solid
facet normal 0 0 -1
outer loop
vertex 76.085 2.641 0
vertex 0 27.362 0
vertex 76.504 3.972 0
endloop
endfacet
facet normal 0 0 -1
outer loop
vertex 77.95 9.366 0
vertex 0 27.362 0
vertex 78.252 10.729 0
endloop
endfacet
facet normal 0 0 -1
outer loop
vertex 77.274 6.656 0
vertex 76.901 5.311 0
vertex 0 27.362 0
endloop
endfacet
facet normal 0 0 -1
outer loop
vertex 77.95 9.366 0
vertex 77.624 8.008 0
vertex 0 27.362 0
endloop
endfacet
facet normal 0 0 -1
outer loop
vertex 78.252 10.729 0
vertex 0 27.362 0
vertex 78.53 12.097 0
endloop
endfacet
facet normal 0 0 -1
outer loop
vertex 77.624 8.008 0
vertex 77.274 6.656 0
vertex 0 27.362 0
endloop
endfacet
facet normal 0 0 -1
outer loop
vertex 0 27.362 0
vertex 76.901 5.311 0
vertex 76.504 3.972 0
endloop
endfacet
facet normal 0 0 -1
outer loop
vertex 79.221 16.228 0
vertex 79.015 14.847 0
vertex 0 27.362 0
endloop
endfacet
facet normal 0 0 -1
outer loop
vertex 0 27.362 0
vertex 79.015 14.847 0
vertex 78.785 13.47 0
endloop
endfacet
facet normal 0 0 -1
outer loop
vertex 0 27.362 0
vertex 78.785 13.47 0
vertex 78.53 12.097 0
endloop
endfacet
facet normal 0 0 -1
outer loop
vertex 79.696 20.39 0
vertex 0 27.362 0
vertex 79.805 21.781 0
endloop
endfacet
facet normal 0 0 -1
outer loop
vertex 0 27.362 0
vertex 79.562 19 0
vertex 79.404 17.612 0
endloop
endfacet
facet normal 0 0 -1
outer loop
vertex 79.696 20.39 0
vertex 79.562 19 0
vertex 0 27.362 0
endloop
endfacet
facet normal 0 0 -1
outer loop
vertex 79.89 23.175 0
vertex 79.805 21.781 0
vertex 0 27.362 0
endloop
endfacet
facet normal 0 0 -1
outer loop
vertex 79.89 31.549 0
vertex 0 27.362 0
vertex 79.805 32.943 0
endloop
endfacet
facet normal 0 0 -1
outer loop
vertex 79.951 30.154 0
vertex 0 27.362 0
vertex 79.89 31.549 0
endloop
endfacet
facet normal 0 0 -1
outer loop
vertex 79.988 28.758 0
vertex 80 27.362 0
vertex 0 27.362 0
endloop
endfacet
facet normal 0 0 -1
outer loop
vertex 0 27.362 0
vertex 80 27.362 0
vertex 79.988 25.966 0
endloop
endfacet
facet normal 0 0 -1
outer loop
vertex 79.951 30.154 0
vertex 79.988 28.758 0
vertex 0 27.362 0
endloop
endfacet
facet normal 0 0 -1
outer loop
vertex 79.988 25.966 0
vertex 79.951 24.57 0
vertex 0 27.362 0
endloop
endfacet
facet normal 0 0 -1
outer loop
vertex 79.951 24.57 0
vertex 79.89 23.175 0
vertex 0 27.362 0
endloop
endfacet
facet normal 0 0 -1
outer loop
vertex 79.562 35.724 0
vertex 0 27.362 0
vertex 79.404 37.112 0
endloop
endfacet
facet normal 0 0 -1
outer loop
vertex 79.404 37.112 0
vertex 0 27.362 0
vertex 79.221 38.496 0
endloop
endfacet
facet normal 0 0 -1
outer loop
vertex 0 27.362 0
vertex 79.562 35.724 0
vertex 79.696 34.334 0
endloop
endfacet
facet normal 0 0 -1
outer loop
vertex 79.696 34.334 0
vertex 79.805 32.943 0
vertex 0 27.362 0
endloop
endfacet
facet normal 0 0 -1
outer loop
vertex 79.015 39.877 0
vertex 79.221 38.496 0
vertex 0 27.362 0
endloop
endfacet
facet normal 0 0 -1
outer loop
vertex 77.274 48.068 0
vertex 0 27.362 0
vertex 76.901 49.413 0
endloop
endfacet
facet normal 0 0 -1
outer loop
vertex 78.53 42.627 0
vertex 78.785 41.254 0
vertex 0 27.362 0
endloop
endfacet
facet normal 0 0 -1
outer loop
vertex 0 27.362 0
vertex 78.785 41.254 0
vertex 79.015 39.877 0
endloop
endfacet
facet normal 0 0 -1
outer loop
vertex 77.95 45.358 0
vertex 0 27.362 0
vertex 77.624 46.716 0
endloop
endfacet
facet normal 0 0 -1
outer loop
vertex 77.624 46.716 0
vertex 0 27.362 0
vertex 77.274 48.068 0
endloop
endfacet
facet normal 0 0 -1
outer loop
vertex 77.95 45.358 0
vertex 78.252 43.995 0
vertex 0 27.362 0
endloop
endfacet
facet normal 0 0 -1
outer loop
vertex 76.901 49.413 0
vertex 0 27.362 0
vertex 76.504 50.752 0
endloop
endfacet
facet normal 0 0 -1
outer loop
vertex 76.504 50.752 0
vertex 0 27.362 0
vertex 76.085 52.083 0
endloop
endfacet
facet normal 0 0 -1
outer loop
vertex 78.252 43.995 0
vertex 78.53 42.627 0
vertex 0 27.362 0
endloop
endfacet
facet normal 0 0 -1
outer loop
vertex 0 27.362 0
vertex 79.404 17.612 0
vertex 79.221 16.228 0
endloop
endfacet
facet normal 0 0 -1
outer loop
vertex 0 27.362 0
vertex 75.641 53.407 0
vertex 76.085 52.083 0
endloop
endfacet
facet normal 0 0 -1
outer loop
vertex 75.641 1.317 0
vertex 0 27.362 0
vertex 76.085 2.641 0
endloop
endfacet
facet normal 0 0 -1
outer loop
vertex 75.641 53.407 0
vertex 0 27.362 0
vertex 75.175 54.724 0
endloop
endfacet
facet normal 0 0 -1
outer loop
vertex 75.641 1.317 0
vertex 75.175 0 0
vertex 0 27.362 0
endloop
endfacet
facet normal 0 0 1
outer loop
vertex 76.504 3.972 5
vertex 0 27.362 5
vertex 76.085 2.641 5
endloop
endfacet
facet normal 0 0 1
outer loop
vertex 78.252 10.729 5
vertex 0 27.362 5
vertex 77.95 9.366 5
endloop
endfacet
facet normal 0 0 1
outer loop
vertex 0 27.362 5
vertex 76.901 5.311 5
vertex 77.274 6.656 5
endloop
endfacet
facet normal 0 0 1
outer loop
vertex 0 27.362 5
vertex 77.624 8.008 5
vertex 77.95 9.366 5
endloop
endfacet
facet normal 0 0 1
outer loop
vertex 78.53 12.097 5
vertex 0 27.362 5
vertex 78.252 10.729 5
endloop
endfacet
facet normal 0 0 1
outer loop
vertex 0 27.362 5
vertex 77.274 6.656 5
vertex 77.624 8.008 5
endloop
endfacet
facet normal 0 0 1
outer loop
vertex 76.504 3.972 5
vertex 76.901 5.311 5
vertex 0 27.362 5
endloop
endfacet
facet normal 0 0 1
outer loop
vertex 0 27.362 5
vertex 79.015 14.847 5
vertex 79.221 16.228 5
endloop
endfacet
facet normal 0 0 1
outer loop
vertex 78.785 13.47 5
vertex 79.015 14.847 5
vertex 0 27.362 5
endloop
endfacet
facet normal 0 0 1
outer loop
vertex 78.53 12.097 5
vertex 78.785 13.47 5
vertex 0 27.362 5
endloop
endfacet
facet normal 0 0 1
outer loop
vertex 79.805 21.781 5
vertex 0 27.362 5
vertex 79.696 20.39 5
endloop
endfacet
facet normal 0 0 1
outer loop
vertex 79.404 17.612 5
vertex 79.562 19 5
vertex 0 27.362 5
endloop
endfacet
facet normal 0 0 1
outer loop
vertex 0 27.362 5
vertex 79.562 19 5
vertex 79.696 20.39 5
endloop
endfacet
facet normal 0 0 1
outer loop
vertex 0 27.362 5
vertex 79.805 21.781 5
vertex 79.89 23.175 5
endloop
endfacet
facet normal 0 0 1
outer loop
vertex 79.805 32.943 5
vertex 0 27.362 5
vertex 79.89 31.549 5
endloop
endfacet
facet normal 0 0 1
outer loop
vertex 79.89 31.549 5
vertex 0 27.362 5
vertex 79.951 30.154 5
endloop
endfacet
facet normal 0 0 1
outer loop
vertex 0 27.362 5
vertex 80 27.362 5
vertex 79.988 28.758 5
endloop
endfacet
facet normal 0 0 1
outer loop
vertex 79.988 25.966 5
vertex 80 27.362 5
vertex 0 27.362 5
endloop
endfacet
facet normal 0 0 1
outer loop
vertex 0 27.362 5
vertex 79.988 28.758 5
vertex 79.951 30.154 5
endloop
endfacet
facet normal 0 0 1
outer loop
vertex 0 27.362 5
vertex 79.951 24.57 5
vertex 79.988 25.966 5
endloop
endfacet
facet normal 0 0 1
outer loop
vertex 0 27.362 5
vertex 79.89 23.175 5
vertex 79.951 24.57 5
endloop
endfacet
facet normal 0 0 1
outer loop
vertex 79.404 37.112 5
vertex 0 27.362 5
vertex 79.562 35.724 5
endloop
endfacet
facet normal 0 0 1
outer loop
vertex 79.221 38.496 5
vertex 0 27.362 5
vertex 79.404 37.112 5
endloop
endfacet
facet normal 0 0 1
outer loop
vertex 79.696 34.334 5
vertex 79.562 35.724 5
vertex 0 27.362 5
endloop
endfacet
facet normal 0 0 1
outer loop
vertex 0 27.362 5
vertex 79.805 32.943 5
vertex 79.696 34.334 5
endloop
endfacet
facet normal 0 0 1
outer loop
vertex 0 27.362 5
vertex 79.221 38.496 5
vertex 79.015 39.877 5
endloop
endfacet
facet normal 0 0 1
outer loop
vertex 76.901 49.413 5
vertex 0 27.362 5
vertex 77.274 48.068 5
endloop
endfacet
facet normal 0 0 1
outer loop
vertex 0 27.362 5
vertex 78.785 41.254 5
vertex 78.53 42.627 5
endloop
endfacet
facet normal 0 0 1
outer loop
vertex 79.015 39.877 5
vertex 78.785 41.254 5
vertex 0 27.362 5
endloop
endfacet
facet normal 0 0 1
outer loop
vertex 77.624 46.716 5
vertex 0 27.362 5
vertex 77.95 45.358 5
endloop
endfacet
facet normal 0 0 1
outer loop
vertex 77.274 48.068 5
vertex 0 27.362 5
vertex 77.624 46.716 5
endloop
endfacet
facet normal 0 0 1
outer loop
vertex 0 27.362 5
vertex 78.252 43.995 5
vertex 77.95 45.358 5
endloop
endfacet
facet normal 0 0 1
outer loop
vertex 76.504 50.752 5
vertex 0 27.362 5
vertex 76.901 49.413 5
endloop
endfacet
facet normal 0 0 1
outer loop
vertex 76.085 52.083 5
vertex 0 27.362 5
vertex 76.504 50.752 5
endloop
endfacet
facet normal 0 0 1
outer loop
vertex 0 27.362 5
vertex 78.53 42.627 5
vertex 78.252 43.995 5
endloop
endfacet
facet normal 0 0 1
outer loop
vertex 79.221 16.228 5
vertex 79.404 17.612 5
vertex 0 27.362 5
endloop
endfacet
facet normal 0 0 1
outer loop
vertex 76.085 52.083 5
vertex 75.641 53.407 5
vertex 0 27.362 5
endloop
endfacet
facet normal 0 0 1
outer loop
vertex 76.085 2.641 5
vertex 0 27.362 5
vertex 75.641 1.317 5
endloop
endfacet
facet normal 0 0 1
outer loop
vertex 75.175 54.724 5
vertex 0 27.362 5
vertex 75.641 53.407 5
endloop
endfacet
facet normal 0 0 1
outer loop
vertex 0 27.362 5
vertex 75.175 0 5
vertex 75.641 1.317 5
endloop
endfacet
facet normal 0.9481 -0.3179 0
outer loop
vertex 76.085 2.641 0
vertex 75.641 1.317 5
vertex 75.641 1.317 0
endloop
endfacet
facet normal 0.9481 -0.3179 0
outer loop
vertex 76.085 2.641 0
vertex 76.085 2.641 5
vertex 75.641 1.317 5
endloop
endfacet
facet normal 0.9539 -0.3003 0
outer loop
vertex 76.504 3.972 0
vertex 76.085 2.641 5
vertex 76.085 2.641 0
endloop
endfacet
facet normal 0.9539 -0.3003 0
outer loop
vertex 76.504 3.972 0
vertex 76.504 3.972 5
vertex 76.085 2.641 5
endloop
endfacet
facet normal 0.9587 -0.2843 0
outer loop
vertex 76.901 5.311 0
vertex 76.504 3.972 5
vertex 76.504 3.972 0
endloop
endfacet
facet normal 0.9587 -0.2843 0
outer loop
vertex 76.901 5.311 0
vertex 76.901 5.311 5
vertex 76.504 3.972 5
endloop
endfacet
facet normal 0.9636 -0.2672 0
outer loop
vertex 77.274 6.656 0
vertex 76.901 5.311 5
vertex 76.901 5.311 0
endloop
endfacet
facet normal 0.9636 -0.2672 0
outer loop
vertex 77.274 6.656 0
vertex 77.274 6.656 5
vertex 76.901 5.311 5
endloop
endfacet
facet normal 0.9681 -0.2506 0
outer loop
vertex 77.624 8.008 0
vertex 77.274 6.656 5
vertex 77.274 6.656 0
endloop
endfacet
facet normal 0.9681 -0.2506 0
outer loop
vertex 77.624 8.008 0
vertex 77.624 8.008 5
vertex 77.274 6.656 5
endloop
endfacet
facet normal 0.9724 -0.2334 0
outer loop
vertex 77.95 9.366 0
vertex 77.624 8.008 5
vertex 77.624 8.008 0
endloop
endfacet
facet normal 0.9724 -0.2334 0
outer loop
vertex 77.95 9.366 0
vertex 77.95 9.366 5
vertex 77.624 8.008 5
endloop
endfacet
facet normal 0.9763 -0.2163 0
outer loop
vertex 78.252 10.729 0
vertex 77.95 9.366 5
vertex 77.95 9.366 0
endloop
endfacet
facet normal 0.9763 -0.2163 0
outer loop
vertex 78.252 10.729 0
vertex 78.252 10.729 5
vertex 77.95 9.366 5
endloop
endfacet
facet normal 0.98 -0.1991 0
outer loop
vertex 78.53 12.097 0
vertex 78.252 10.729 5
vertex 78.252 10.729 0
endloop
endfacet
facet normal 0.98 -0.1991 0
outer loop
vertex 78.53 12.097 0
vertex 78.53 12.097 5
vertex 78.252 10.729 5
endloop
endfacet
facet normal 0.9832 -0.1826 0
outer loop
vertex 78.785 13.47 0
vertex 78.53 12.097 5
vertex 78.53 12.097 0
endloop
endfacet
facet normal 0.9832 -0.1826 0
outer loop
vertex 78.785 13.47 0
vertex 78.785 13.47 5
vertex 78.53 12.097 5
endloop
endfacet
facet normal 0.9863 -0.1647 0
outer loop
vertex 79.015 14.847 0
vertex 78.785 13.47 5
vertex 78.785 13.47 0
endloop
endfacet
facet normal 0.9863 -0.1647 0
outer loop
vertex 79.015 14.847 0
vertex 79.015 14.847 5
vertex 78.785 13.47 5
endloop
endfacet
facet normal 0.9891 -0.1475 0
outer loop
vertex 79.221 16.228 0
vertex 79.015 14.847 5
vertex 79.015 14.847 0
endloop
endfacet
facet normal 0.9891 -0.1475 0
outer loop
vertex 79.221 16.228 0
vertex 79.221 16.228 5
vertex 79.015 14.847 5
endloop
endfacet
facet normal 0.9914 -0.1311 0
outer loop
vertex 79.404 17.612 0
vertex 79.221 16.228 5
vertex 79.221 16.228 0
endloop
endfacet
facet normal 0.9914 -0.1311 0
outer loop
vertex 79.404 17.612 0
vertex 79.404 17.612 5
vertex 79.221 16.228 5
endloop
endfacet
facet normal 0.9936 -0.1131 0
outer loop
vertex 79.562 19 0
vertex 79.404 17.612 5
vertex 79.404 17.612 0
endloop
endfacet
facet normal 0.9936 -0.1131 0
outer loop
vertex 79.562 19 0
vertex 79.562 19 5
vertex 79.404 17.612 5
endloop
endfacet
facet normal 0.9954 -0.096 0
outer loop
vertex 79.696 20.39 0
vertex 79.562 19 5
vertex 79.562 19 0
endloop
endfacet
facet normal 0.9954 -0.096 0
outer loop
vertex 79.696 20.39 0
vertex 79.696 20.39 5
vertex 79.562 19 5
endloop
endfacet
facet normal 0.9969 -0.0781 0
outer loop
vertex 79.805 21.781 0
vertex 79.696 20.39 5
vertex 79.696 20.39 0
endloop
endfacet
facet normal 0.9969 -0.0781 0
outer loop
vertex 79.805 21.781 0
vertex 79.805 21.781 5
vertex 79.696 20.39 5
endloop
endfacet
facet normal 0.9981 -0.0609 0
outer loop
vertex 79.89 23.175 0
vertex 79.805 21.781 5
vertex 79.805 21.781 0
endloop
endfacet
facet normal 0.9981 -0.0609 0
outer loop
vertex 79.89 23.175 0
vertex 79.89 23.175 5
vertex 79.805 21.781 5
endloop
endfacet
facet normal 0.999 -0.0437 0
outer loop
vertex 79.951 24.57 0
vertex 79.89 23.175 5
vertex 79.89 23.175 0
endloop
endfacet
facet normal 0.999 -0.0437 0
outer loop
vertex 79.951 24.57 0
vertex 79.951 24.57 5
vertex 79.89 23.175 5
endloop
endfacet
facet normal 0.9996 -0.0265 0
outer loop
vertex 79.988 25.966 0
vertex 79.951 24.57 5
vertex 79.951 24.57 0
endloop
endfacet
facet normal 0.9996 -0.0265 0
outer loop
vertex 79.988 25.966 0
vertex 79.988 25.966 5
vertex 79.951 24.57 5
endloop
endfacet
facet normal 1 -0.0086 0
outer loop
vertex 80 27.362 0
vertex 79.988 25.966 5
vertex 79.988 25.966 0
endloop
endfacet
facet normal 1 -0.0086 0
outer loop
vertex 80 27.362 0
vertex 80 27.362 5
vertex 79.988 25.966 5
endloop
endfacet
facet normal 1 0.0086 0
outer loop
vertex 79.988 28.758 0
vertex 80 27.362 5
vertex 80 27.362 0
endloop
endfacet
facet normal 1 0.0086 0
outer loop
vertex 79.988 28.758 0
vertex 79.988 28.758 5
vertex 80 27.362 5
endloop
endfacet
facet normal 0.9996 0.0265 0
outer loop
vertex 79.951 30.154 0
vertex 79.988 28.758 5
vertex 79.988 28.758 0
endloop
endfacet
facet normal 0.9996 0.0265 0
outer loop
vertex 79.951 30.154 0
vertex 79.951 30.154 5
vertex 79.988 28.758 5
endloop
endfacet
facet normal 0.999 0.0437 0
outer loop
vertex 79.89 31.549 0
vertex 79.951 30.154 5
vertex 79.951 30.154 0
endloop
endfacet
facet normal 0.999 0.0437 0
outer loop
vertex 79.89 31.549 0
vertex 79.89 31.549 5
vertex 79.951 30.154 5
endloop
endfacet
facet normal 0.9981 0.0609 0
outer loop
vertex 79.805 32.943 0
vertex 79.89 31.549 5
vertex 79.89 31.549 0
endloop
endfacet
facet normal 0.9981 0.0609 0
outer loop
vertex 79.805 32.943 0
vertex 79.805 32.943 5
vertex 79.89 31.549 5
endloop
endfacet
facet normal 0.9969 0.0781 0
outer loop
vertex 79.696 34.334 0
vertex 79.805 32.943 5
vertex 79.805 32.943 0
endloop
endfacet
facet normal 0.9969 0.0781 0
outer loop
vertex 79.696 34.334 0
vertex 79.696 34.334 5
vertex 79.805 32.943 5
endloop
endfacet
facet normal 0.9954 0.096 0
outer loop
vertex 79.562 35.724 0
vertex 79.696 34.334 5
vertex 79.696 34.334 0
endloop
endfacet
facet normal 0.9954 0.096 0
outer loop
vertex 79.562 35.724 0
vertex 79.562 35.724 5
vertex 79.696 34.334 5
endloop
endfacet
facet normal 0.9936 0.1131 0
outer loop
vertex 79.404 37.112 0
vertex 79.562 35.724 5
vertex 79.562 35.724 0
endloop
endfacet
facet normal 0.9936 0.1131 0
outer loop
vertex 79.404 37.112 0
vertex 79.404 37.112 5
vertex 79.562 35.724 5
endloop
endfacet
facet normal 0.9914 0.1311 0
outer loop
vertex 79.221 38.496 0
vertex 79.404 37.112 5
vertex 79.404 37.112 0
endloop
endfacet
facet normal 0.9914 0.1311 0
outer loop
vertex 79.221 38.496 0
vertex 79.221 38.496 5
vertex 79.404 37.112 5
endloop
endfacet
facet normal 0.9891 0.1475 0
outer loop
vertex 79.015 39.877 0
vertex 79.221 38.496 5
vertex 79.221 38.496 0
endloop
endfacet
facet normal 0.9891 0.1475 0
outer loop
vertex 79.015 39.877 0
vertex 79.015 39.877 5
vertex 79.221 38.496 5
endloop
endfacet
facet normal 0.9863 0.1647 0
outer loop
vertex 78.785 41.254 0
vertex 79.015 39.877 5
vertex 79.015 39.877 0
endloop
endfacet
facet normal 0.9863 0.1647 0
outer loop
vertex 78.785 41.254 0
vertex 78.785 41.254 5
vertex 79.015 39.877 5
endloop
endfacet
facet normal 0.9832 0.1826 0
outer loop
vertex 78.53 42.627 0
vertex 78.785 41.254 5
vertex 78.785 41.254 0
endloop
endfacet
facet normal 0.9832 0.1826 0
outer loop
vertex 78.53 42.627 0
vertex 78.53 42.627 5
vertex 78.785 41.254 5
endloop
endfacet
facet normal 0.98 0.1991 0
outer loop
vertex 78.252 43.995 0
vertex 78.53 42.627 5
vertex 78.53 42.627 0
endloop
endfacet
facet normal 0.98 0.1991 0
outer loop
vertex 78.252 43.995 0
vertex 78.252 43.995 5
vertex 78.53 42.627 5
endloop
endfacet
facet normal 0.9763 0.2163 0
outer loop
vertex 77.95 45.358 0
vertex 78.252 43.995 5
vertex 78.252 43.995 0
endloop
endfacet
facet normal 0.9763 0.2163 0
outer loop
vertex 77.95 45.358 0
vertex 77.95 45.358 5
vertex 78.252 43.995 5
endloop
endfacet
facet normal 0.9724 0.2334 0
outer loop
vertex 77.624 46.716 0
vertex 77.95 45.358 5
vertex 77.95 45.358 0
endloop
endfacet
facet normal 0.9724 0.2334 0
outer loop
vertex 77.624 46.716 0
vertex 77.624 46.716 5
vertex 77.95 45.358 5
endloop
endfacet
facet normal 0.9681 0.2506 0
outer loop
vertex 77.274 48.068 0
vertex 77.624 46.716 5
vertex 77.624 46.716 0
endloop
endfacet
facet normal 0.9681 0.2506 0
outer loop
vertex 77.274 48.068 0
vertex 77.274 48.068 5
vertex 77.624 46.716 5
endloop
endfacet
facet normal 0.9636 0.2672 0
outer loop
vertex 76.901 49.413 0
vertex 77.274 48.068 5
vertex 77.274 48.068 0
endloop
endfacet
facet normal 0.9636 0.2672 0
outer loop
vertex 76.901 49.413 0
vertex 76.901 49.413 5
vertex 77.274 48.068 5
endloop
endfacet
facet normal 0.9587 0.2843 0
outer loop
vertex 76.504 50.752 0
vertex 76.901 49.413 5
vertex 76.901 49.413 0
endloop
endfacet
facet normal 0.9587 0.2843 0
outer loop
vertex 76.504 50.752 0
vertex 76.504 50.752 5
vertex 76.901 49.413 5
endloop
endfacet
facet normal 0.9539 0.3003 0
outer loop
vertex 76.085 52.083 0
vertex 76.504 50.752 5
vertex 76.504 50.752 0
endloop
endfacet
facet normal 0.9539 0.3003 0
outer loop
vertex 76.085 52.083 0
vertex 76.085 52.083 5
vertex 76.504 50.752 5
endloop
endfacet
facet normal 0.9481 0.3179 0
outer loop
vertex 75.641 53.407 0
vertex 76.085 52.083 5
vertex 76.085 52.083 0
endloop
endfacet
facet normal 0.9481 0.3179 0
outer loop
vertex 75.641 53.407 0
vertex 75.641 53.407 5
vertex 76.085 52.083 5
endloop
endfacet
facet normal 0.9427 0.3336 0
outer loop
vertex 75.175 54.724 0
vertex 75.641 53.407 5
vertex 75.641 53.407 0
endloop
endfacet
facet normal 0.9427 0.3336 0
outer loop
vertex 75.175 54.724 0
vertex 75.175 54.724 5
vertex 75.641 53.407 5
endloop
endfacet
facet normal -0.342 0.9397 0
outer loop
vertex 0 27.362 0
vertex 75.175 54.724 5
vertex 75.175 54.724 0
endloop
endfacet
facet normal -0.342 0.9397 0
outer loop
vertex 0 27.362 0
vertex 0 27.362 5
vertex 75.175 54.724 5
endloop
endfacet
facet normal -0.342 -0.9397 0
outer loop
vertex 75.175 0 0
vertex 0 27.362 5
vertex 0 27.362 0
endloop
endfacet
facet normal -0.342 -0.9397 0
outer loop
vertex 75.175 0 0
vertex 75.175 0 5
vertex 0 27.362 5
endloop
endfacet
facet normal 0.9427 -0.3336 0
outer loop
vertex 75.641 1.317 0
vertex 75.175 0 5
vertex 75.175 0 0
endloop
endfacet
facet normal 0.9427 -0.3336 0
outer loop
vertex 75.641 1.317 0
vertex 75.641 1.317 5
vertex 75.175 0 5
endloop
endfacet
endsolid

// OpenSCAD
$fn = 32;

// ----------------------------------------------------------------------
// Arc profile plate: sector, 42 points
// ----------------------------------------------------------------------

// --- parameters (mm) ---
sector_angle = 40;        // sector angle, degrees
sector_r = 80;            // outer radius
arc_step = 1;             // sampling step of the arc, degrees
plate_t = 5;              // plate thickness, Z

bbox_x = 2 * sector_r * sin(sector_angle / 2);  // chord of the sector
bbox_y = sector_r;  // depth of the sector (apex to arc)

profile = [[75.175, 0], [75.641, 1.317], [76.085, 2.641], [76.504, 3.972], [76.901, 5.311], [77.274, 6.656], [77.624, 8.008], [77.95, 9.366], [78.252, 10.729], [78.53, 12.097], [78.785, 13.47], [79.015, 14.847], [79.221, 16.228], [79.404, 17.612], [79.562, 19], [79.696, 20.39], [79.805, 21.781], [79.89, 23.175], [79.951, 24.57], [79.988, 25.966], [80, 27.362], [79.988, 28.758], [79.951, 30.154], [79.89, 31.549], [79.805, 32.943], [79.696, 34.334], [79.562, 35.724], [79.404, 37.112], [79.221, 38.496], [79.015, 39.877], [78.785, 41.254], [78.53, 42.627], [78.252, 43.995], [77.95, 45.358], [77.624, 46.716], [77.274, 48.068], [76.901, 49.413], [76.504, 50.752], [76.085, 52.083], [75.641, 53.407], [75.175, 54.724], [0, 27.362]];  // primary outline, 42 points, counter clockwise

// --- the one profile operation ---
linear_extrude(height = plate_t) polygon(points = profile);
